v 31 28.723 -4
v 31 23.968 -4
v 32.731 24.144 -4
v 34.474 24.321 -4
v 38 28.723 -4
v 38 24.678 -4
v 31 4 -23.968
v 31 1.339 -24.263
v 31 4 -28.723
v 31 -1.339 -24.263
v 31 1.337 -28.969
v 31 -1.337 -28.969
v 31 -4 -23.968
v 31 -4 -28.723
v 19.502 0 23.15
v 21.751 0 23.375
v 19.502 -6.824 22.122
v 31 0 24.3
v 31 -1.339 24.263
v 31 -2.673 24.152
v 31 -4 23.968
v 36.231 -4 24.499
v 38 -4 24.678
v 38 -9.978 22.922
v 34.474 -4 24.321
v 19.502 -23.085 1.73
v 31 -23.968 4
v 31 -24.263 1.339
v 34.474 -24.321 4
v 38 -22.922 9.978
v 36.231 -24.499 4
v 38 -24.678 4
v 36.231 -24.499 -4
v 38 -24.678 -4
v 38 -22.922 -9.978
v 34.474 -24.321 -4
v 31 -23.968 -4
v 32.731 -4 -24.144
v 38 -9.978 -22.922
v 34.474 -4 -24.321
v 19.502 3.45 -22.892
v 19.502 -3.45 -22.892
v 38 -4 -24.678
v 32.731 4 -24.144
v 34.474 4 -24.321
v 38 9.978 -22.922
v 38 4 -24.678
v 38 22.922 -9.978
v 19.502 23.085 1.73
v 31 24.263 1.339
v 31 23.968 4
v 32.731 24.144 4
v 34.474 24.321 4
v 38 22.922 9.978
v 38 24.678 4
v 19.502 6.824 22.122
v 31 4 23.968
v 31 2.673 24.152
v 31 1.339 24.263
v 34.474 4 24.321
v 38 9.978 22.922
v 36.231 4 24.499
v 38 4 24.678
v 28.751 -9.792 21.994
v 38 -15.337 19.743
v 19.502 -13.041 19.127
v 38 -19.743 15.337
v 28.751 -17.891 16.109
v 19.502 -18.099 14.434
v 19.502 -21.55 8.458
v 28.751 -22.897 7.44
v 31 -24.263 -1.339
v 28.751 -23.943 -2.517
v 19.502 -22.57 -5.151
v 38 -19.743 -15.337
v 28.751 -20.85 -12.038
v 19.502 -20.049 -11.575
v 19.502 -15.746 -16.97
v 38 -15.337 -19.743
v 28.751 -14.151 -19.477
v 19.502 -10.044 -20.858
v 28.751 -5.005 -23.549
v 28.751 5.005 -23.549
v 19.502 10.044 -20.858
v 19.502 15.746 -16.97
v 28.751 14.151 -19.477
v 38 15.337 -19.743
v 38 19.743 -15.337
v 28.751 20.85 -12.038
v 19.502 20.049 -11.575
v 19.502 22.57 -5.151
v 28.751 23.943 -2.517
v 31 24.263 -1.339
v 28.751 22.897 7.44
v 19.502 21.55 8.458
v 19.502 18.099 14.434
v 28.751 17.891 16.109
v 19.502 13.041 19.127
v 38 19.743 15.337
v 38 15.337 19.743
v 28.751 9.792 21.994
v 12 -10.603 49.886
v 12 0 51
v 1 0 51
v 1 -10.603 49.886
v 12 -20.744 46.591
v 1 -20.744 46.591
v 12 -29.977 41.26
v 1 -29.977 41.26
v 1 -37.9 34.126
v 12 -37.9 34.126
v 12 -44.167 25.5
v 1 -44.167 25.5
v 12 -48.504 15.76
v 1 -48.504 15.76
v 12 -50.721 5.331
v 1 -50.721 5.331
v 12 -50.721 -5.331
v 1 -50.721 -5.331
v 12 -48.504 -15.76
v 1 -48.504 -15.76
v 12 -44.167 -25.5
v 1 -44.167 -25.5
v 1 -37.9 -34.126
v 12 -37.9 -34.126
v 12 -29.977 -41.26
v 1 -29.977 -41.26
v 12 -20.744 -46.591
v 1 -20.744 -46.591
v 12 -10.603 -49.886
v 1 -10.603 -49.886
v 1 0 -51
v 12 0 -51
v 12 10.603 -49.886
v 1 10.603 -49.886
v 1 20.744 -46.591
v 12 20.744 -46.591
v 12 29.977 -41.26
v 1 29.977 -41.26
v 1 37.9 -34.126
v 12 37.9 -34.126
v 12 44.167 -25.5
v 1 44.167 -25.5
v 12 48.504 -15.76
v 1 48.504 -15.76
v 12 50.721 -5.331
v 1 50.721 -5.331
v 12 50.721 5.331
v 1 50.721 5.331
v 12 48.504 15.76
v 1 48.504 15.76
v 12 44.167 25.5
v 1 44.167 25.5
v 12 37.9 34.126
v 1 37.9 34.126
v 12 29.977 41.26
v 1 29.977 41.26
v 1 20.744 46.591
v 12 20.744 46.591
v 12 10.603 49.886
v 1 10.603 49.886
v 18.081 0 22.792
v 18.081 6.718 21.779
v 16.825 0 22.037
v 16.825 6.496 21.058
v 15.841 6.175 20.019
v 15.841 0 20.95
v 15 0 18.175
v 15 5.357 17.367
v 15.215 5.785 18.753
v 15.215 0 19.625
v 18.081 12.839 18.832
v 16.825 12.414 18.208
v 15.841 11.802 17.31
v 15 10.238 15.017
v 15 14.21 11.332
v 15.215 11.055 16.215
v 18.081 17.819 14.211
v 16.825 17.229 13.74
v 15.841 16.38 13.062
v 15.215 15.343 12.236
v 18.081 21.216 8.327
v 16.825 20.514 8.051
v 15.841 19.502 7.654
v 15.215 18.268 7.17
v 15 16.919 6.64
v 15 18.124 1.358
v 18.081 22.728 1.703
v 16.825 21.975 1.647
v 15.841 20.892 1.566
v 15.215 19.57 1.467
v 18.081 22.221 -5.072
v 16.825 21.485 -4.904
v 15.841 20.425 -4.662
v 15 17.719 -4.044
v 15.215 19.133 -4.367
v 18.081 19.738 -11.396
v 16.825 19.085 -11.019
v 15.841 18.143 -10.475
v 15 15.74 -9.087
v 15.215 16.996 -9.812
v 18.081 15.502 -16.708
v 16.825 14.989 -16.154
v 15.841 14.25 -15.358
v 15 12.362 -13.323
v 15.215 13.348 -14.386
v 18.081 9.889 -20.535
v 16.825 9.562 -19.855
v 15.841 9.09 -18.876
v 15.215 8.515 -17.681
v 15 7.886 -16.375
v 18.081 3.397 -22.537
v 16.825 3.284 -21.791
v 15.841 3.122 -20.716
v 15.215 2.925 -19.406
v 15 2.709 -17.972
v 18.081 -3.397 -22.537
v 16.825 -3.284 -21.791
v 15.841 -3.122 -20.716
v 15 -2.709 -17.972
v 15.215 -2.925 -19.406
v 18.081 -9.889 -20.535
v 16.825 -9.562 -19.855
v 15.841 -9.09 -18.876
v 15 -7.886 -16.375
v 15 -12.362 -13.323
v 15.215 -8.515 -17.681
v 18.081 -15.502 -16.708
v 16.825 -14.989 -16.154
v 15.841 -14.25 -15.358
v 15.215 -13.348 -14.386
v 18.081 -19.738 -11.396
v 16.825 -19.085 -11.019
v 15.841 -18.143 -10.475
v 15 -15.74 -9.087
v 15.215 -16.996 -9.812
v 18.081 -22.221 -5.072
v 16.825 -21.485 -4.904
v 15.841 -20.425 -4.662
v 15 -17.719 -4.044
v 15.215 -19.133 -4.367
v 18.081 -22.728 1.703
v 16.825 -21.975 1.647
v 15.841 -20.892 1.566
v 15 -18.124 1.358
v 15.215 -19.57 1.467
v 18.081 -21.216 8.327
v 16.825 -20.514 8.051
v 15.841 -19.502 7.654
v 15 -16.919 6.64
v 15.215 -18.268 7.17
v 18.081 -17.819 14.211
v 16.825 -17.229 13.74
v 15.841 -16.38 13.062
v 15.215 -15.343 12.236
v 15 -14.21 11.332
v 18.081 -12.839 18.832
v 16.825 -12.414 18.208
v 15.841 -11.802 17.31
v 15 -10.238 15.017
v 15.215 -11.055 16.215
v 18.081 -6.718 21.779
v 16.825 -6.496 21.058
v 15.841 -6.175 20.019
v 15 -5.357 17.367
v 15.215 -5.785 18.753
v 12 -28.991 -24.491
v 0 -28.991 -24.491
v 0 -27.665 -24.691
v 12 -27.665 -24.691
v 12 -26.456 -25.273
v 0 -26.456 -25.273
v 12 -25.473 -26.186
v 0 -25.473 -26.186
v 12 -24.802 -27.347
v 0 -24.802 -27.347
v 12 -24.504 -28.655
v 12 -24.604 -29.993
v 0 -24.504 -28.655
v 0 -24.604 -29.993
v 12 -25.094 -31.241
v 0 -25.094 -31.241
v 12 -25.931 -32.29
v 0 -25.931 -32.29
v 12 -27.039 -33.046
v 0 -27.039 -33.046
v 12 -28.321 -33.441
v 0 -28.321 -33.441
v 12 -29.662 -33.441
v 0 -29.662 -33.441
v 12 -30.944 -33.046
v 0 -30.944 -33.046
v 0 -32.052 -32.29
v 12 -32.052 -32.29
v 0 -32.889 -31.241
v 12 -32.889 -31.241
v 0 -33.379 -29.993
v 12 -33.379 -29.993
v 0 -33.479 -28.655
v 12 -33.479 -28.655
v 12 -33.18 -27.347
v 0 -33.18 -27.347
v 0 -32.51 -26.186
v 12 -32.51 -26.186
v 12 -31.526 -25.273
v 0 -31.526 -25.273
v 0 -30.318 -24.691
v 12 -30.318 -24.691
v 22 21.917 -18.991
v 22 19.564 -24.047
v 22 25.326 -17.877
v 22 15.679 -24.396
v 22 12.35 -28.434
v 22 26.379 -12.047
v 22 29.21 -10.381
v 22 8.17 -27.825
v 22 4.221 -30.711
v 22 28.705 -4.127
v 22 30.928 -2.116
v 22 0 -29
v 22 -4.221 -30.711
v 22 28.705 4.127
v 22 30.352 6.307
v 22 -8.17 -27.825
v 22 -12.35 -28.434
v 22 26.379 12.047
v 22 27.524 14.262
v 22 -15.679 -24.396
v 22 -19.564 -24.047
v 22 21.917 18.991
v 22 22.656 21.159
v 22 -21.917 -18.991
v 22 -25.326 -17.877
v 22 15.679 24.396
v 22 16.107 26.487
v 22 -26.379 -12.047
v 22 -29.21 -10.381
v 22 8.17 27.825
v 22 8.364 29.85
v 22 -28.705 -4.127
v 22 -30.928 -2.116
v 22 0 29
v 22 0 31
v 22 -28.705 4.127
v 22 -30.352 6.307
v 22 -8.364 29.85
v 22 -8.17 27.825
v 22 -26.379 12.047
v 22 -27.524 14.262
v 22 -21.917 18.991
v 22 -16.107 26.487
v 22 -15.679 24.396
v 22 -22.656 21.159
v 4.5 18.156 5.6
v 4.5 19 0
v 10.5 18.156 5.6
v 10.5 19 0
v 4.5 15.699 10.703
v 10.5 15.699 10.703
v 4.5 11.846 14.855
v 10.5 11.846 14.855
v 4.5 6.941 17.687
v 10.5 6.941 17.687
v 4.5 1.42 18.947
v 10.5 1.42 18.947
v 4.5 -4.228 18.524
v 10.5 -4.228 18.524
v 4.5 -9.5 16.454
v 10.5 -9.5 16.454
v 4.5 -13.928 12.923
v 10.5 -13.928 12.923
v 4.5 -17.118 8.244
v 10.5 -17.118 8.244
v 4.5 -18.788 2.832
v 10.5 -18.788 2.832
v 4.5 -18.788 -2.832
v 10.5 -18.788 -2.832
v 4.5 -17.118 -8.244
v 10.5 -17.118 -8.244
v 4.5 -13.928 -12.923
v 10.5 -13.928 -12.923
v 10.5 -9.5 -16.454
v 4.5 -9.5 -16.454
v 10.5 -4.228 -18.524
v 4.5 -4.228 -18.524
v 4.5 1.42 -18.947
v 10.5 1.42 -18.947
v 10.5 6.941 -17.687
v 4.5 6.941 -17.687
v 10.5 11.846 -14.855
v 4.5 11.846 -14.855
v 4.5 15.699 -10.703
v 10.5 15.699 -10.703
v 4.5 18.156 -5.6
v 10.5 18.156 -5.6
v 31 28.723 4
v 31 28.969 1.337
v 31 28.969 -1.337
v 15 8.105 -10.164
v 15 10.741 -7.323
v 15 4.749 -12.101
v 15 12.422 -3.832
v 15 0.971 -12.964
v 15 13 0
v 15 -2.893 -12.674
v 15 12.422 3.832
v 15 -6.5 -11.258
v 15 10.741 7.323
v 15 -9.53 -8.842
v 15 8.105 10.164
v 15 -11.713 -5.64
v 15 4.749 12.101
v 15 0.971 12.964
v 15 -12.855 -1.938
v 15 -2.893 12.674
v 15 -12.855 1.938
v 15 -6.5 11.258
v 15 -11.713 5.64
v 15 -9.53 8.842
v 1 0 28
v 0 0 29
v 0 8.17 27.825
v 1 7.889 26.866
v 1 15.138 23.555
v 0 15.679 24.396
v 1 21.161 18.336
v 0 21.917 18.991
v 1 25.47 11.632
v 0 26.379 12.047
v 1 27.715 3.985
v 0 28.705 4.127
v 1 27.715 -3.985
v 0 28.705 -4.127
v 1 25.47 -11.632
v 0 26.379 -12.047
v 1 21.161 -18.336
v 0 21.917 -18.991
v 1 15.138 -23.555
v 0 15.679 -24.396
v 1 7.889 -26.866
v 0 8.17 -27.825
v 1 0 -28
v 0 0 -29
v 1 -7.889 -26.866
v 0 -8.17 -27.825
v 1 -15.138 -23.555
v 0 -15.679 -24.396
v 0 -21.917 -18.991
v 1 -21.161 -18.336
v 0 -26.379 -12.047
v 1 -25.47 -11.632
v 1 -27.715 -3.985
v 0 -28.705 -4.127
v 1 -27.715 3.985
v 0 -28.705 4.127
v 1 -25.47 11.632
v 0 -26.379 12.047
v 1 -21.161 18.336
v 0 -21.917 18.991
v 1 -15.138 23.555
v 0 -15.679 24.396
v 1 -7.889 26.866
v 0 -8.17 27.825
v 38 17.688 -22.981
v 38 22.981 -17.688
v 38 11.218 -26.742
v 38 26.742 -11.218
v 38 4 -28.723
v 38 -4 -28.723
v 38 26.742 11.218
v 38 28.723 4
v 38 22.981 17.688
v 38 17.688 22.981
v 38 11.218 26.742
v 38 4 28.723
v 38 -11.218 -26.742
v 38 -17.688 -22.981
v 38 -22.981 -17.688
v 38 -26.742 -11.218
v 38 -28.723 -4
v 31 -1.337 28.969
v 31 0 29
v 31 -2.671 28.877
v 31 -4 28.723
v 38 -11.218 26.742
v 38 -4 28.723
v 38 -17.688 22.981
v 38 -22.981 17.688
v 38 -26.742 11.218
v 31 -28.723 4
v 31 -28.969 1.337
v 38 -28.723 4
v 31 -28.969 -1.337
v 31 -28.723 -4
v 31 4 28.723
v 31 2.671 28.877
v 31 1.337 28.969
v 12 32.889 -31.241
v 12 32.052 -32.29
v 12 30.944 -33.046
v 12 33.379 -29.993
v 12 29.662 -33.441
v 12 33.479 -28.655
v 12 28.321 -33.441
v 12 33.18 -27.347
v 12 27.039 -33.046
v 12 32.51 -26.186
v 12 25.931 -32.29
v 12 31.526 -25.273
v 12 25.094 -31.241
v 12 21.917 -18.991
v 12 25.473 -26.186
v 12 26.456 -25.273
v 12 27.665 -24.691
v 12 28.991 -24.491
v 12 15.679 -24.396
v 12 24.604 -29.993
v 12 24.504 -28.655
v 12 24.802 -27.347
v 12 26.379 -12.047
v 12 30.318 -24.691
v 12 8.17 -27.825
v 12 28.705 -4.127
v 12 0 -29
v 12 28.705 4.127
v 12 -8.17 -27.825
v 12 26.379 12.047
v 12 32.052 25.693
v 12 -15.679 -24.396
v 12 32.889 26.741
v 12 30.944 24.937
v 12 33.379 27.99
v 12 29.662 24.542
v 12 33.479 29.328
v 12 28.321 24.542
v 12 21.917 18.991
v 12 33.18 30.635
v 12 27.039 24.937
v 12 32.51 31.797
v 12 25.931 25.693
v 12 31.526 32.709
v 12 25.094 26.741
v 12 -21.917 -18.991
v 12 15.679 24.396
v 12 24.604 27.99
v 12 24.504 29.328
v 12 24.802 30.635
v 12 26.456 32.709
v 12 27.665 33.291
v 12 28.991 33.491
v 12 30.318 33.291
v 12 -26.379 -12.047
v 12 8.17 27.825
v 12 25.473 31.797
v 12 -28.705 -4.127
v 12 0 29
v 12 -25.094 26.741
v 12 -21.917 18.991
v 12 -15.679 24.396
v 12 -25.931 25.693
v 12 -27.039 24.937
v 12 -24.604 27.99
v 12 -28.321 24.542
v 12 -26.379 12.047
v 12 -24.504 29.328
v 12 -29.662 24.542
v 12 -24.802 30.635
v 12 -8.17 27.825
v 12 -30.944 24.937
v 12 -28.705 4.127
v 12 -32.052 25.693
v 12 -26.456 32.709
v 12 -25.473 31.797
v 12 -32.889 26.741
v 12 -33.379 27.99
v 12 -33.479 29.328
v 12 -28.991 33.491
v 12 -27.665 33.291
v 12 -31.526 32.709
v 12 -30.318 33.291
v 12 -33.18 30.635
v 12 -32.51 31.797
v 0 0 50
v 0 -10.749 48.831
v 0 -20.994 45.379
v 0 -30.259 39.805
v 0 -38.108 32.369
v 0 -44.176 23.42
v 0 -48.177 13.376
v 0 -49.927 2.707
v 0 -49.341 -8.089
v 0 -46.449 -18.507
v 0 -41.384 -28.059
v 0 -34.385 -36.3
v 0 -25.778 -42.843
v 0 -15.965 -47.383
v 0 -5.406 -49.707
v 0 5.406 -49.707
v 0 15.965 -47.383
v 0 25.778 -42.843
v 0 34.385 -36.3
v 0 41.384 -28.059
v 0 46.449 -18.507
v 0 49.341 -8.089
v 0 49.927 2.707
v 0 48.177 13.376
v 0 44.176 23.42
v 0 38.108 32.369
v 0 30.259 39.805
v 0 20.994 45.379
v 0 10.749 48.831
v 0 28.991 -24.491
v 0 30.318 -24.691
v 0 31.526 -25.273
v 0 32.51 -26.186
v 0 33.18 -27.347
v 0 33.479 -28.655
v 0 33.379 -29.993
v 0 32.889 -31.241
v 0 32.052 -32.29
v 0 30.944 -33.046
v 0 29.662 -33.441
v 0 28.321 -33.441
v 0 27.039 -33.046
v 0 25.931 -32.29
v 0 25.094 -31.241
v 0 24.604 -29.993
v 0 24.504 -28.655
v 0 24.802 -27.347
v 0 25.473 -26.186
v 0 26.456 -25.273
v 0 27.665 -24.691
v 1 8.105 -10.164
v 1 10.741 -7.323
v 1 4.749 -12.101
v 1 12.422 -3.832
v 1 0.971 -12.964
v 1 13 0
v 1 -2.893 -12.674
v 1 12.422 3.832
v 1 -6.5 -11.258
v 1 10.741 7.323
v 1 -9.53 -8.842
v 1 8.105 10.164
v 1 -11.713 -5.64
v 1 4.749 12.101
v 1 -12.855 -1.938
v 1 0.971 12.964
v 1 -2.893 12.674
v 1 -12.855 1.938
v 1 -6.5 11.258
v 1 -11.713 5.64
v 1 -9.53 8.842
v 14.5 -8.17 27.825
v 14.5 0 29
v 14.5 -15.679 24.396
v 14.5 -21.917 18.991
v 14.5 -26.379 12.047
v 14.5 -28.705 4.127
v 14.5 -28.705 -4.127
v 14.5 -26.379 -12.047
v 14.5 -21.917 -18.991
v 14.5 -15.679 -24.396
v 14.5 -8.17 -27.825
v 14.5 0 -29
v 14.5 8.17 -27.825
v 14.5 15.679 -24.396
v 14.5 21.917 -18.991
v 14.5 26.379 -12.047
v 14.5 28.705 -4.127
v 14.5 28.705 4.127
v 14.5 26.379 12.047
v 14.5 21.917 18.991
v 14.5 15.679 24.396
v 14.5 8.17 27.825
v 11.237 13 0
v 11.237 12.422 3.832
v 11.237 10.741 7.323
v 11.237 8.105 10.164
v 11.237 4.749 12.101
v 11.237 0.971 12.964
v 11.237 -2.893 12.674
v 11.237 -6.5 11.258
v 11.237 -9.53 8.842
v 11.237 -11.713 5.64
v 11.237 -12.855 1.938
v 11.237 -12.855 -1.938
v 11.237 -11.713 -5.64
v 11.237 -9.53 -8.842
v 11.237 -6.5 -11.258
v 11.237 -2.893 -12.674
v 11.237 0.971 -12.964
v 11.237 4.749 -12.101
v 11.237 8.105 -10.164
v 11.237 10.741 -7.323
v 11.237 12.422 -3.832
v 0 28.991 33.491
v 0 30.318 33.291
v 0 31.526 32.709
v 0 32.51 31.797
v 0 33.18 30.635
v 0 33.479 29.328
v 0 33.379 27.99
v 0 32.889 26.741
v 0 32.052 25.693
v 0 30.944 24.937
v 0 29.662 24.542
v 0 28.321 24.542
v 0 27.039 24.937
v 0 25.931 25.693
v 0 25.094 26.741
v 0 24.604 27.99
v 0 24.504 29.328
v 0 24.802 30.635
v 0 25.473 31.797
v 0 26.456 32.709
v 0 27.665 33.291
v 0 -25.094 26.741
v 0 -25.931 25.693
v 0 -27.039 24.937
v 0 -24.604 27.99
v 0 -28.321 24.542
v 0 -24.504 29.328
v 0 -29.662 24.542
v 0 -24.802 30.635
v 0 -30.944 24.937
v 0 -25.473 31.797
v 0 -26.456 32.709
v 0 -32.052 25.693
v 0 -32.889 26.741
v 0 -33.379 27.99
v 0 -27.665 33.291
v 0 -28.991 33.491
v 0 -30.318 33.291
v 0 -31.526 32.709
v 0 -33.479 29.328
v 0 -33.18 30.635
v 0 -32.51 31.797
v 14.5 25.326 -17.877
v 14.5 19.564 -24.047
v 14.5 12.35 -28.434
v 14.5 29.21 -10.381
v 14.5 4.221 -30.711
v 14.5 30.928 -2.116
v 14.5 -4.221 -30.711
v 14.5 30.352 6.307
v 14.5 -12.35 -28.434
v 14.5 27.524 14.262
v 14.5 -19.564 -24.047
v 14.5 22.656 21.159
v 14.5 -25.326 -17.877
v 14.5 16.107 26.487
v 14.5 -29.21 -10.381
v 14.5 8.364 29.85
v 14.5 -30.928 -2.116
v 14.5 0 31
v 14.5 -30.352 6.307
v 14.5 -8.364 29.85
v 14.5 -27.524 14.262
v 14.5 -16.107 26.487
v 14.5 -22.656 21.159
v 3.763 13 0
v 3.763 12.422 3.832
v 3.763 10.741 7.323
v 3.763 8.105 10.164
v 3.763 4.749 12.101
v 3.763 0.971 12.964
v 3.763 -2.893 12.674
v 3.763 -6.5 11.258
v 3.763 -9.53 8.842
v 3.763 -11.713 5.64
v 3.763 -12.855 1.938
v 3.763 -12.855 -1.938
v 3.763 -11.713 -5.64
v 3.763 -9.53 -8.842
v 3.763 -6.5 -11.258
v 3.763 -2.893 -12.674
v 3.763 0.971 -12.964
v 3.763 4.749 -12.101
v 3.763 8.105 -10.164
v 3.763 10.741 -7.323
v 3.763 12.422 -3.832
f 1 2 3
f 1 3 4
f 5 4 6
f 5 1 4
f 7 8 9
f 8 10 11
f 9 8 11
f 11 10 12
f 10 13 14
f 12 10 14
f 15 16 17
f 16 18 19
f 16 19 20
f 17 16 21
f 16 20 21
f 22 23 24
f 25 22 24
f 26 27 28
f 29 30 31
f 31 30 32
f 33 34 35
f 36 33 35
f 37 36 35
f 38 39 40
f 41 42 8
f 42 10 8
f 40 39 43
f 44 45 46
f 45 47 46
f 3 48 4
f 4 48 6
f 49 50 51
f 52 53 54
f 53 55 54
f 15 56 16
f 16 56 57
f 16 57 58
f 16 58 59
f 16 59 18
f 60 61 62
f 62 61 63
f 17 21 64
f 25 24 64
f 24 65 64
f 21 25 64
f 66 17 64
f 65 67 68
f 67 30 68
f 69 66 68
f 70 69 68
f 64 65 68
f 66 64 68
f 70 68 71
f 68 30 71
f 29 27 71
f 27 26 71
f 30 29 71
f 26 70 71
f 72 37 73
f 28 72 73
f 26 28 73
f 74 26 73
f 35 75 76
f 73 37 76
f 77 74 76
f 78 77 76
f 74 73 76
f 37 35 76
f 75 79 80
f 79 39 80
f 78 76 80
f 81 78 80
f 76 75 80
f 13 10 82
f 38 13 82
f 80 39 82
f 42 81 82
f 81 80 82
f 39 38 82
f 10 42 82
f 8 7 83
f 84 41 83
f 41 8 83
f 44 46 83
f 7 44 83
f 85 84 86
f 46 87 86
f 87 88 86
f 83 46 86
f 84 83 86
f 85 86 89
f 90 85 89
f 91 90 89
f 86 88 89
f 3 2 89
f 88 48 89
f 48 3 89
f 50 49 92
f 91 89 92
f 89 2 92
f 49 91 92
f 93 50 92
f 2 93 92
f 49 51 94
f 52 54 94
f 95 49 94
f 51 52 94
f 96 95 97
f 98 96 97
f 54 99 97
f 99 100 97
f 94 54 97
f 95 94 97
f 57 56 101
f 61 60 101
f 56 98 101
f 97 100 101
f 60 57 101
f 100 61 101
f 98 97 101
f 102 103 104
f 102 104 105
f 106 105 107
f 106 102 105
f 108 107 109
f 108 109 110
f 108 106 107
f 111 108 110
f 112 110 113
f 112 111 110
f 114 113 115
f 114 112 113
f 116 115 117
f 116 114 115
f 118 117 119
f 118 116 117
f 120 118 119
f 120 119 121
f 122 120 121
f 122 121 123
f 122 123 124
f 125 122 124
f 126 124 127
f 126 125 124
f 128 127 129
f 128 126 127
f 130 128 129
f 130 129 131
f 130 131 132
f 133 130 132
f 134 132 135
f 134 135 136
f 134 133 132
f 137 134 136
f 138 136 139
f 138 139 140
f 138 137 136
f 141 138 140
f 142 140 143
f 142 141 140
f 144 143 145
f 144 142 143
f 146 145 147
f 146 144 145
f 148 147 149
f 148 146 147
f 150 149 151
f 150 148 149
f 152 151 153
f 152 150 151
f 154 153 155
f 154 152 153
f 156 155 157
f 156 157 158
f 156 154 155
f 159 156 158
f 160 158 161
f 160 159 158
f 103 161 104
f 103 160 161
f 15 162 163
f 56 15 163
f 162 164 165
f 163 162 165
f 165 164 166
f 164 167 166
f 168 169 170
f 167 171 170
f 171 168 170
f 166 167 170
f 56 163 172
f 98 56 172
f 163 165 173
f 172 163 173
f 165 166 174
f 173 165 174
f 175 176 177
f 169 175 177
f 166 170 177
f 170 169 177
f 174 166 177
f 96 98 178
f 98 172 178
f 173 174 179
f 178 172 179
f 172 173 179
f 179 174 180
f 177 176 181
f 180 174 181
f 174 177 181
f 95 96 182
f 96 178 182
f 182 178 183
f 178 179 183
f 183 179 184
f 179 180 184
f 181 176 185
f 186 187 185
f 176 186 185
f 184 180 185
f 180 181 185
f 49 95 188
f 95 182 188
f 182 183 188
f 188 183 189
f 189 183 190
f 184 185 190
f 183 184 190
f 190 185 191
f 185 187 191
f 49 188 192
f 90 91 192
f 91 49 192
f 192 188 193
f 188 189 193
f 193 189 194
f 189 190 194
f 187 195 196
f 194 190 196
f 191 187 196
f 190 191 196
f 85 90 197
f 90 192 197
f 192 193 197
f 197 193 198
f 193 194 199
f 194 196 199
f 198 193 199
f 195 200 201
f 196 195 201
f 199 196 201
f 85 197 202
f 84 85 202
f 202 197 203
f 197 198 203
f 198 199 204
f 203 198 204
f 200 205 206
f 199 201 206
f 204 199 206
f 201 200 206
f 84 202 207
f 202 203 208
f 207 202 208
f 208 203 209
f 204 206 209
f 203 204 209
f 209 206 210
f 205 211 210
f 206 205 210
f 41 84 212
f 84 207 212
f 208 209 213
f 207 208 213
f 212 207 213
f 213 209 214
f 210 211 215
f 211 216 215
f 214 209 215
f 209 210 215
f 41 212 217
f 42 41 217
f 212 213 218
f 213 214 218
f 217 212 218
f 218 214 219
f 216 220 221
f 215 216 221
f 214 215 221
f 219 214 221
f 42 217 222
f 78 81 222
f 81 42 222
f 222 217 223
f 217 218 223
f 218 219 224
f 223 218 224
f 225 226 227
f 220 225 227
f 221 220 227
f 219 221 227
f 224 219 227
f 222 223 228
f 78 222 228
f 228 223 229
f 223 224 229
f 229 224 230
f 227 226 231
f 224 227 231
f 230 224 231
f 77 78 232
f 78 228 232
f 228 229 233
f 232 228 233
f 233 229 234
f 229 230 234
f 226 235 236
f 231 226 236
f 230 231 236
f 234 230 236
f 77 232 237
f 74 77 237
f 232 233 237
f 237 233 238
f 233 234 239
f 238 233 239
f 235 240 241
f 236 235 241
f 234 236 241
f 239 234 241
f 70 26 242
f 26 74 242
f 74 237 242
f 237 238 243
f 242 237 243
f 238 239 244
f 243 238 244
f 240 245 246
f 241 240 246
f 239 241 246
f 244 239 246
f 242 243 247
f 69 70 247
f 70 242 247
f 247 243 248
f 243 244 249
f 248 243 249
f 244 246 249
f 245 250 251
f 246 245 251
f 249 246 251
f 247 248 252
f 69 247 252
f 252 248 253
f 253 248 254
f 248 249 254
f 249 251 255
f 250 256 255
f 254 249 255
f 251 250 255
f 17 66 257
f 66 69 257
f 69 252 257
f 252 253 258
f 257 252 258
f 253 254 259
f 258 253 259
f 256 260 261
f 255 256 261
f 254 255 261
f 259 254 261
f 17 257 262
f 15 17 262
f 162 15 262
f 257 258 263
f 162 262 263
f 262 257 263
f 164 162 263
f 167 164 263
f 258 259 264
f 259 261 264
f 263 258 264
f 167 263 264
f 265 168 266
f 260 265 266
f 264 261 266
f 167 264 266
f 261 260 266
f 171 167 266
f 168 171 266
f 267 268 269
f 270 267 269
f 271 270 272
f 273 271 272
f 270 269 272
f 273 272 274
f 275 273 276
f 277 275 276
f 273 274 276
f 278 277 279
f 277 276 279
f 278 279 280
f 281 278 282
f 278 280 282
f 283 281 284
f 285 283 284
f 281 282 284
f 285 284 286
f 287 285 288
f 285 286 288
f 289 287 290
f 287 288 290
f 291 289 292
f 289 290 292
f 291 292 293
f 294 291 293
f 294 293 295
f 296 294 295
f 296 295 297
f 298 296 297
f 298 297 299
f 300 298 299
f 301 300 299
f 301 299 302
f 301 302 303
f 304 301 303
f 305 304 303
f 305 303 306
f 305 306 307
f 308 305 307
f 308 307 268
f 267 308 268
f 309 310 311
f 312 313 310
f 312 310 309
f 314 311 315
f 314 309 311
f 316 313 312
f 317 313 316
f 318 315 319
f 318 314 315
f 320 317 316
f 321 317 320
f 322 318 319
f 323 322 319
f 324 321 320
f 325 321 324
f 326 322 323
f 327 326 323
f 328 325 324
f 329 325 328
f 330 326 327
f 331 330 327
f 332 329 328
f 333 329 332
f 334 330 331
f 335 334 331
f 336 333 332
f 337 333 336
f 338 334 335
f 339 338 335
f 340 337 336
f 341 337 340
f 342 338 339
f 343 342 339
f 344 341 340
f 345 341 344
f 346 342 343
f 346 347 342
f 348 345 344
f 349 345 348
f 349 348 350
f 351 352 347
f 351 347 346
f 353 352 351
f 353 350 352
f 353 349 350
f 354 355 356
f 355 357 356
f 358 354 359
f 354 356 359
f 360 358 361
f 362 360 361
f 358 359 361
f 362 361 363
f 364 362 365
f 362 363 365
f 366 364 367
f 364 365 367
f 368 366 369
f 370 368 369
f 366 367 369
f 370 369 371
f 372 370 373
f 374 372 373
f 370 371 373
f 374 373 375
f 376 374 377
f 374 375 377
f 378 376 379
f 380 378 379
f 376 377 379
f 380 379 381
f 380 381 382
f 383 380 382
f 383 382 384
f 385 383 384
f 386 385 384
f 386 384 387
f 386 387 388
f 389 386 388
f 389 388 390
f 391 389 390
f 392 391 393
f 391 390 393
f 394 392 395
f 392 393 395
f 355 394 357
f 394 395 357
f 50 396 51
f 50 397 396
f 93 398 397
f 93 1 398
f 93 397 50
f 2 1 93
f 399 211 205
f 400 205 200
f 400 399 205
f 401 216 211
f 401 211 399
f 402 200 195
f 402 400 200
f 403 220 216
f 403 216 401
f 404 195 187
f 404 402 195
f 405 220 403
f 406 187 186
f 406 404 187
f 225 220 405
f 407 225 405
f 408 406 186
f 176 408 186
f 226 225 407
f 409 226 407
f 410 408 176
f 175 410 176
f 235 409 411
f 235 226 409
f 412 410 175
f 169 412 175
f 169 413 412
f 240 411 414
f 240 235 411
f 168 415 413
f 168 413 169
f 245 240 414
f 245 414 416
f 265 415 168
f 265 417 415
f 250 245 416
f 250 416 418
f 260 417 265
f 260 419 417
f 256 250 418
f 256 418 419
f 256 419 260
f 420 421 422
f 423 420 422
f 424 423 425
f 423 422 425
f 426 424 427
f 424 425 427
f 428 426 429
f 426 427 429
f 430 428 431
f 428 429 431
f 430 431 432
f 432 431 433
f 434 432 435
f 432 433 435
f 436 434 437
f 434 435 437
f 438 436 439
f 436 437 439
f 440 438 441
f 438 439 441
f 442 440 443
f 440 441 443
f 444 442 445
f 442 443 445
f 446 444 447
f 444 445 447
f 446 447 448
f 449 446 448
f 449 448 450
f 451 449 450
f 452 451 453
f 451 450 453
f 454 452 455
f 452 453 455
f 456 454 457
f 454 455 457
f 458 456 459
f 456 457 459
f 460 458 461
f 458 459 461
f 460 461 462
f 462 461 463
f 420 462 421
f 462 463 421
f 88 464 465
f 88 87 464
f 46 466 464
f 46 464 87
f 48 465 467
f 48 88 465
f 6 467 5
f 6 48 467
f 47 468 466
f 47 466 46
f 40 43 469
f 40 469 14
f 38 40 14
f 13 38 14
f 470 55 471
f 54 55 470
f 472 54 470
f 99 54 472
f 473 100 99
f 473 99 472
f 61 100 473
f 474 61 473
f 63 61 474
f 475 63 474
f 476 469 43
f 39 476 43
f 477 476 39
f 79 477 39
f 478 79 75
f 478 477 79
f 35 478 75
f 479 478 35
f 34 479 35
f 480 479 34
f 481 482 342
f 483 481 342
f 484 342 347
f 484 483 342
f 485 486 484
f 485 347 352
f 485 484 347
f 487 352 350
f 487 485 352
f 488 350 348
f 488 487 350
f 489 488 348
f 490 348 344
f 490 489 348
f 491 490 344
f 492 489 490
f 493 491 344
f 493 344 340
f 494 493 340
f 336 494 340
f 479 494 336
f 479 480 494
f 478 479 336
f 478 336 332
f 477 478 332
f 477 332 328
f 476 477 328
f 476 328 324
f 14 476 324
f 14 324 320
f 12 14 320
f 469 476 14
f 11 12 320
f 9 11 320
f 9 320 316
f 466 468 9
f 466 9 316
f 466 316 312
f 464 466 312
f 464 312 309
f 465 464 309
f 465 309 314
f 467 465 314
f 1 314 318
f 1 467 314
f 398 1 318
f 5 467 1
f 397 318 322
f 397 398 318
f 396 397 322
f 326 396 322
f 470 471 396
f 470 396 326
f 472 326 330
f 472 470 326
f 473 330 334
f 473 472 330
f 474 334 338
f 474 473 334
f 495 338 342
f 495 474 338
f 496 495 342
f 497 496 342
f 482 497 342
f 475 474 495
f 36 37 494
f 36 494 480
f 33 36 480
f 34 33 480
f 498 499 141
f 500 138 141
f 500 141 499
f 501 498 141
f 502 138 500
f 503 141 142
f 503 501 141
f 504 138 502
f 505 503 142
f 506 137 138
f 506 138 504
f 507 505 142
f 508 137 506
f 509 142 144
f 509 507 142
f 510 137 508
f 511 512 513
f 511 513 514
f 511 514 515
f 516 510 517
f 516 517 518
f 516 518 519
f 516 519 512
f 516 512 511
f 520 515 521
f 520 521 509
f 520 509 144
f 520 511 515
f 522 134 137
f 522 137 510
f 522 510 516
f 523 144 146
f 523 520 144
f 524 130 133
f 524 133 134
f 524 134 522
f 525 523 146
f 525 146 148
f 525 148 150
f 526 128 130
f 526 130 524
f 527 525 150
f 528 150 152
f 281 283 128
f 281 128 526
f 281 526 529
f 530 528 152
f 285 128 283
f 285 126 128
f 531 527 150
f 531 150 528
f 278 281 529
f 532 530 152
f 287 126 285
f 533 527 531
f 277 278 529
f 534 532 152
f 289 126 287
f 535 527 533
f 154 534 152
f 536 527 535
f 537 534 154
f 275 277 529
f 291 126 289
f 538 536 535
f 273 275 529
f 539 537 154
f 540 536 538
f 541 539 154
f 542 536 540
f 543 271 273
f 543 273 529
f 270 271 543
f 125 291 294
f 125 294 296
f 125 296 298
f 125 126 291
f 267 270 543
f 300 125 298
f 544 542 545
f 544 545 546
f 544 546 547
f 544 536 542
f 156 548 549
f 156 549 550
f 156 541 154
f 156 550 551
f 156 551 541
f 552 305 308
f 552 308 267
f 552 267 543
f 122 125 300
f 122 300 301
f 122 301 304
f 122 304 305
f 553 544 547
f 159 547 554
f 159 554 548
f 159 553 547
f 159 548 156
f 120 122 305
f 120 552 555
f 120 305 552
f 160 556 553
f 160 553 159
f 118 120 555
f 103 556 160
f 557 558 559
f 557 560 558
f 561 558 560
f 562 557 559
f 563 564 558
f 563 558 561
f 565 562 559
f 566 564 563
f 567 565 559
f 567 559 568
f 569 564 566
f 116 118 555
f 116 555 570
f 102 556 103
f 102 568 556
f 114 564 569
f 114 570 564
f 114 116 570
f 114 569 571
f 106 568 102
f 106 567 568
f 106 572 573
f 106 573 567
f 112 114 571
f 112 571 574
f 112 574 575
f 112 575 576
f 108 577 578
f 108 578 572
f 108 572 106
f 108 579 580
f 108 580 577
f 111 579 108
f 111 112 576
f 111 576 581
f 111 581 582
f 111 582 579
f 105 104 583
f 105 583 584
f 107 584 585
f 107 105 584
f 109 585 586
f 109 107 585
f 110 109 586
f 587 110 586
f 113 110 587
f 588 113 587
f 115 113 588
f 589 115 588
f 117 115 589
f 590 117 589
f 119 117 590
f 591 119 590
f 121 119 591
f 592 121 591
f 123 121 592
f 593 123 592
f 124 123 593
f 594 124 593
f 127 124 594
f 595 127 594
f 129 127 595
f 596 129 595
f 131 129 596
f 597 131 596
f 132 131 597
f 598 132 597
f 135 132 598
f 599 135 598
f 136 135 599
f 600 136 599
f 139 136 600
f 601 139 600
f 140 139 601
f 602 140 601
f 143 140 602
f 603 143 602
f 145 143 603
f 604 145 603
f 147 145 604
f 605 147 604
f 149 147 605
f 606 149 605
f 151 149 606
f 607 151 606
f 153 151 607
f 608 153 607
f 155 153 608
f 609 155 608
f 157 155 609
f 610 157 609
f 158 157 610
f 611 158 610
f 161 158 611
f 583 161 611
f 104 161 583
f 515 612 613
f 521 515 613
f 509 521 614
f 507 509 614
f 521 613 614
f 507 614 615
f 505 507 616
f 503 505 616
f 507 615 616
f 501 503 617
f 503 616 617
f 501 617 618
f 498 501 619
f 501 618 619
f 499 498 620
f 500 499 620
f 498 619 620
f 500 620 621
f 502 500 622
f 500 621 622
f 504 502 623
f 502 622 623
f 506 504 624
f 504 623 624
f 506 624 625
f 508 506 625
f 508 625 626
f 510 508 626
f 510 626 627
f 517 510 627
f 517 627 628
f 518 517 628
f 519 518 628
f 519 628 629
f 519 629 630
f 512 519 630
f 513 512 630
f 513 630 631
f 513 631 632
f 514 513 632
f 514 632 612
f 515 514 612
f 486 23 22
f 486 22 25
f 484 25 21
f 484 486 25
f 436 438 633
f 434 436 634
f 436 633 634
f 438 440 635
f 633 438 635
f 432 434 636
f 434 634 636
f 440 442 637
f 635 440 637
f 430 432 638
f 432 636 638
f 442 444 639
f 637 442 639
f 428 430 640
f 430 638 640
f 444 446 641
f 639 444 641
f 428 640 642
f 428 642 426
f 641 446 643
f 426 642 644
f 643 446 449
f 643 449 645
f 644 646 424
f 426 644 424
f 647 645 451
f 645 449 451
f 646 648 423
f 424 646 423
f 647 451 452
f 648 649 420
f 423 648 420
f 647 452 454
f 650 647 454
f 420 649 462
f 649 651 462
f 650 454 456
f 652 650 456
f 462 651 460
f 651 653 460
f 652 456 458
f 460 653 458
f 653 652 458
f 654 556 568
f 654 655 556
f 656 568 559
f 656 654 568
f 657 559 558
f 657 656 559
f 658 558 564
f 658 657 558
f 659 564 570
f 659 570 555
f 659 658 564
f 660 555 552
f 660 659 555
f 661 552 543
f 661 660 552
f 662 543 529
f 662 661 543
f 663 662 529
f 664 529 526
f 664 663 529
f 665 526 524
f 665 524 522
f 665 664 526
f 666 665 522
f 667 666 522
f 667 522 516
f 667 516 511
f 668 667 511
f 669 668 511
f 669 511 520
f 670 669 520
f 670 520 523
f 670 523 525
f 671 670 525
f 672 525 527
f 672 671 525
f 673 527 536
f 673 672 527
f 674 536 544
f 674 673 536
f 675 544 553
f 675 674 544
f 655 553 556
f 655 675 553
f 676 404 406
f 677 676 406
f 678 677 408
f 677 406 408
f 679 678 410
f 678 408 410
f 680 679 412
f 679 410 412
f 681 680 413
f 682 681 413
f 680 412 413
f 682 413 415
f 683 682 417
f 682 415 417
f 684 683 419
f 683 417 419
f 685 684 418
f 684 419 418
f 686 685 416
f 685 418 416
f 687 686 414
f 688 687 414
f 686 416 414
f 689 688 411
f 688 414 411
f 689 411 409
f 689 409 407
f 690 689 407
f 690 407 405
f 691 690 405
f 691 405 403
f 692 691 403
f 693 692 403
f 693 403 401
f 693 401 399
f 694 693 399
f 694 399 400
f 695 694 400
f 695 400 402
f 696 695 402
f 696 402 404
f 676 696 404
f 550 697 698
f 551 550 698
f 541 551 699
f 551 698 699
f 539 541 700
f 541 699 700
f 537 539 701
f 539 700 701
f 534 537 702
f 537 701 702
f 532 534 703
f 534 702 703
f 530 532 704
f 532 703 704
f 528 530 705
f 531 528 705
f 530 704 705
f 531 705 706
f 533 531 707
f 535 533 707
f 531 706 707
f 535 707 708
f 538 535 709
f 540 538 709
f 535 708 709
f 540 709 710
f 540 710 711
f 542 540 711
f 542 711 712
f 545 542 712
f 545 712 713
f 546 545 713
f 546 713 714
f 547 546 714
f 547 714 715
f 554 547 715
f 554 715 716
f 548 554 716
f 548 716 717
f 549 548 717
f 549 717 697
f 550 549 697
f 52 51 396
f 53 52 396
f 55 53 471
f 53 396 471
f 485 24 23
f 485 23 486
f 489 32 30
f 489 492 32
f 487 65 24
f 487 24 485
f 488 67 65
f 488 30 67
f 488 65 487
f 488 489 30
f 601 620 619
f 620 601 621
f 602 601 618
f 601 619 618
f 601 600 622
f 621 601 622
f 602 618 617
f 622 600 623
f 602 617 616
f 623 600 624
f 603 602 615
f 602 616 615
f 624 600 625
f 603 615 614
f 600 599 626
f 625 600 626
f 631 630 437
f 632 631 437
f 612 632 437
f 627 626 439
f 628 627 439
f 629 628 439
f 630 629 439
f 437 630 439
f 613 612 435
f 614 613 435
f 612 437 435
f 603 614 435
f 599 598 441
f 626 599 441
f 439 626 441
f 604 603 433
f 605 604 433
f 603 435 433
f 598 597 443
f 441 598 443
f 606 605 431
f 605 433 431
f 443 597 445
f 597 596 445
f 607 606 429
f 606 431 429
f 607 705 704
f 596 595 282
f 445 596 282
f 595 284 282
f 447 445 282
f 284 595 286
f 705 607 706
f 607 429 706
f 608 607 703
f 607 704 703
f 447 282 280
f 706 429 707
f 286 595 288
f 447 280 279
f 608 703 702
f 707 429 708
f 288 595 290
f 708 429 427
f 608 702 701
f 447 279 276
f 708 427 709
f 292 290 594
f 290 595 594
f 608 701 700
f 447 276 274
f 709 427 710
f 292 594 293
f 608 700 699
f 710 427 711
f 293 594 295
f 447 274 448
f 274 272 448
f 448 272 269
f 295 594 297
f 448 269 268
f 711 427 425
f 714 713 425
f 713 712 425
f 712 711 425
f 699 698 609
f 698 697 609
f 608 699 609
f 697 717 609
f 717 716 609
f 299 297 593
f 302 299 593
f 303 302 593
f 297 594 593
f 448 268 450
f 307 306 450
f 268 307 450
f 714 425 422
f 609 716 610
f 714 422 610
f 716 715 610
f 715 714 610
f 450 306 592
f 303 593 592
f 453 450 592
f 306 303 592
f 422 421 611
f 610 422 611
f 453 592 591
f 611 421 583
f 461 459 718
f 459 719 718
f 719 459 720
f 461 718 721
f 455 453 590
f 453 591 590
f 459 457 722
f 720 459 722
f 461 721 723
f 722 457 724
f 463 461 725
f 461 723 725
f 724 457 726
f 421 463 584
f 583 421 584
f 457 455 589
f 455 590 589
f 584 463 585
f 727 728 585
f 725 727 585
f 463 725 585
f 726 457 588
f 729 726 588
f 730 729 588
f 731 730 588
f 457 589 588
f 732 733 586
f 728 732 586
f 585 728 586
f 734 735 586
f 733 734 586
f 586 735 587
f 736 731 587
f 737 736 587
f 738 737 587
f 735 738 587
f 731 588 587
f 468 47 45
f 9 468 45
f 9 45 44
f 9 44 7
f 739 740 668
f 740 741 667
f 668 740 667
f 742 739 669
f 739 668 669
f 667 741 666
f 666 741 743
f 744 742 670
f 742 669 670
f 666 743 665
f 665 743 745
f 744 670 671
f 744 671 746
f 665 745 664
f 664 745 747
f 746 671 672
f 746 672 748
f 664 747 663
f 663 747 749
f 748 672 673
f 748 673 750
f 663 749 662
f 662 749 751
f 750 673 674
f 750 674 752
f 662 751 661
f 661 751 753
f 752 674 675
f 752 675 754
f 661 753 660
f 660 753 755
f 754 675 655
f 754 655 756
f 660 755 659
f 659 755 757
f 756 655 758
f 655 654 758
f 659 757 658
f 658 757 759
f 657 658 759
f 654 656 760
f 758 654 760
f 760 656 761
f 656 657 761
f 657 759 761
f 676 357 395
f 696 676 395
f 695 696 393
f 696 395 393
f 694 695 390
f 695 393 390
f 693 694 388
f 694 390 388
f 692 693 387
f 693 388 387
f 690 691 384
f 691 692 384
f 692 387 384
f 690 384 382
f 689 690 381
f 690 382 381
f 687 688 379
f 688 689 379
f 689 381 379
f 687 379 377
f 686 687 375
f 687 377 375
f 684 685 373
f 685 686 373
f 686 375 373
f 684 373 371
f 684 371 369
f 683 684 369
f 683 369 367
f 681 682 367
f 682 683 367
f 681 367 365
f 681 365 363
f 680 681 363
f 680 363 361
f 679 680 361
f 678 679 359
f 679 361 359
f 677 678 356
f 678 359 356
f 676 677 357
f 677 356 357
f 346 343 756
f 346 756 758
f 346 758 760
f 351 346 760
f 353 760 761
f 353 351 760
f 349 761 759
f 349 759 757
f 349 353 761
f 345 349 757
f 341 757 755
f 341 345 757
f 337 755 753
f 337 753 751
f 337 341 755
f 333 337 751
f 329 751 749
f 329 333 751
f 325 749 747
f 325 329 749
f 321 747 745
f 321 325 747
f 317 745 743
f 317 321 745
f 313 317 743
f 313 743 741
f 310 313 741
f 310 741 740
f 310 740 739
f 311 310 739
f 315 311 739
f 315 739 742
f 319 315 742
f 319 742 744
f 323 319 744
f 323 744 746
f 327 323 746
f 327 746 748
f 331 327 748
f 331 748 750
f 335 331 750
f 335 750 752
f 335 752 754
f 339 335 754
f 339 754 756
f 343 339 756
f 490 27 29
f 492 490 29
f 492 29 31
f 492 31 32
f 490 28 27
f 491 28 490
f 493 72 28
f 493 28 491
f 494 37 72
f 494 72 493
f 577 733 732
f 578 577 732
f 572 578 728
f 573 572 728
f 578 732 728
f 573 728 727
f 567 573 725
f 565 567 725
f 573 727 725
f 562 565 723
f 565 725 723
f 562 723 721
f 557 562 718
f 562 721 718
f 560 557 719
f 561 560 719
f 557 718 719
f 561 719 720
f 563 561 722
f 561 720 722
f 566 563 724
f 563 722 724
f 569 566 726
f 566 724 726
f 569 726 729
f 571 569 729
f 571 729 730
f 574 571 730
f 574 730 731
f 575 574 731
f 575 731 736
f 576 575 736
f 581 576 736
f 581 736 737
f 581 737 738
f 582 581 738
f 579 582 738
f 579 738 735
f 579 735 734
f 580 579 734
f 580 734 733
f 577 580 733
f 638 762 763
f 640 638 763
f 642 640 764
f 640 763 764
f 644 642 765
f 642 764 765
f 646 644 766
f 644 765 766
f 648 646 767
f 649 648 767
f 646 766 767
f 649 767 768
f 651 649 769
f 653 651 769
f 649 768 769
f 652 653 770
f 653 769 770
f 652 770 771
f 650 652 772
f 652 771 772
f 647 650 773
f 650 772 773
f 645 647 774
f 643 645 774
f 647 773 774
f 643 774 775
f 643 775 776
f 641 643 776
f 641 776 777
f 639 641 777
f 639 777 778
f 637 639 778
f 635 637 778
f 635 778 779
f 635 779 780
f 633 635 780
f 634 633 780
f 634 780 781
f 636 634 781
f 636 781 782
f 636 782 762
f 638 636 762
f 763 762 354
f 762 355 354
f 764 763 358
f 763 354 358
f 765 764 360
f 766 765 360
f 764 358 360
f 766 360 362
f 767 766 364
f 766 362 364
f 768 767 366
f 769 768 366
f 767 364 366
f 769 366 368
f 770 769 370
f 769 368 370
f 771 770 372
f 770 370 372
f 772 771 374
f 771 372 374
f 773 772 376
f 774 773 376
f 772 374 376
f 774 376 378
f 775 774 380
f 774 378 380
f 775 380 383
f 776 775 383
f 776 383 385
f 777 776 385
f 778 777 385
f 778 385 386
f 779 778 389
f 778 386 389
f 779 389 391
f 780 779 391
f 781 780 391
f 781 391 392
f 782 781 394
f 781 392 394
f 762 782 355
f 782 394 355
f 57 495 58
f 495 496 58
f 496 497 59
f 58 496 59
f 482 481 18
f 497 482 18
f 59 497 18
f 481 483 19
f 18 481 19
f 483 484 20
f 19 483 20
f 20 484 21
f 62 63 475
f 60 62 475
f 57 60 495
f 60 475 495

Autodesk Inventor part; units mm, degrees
ref_plane "YZ Plane" through (0, 0, 0) normal (1, 0, 0) x (0, 1, 0)
ref_plane "XZ Plane" through (0, 0, 0) normal (0, 1, 0) x (-1, 0, 0)
ref_plane "XY Plane" through (0, 0, 0) normal (0, 0, 1) x (1, 0, 0)
sketch "草图1" plane through (0, 0, 0) normal (0, 1, 0) x (-1, 0, 0)
  line L0 (0, 51) -> (-12, 51)
  line L1 (-12, 51) -> (-12, 29)
  line L2 (-12, 29) -> (-14.5, 29)
  line L3 (-14.5, 29) -> (-14.5, 31)
  line L4 (-14.5, 31) -> (-22, 31)
  line L5 (-22, 31) -> (-22, 29)
  line L6 (-22, 29) -> (-38, 29)
  line L7 (-38, 29) -> (-38, 0)
  line L8 (-38, 0) -> (0, 0)
  line L9 (0, 0) -> (0, 51)
  line L10 (0, 29) -> (-1, 28)
  line L11 (-1, 28) -> (-1, 0)
  line L12 (-38, 25) -> (-15, 22.6998)
  line L13 (-15, 22.6998) -> (-15, 0)
  line L14 (7.6, 0) -> (-45.6, 0) projected
  dimension "d2" = 51
  dimension "d4" = 26
  dimension "d5" = 12
  dimension "d6" = 31
  dimension "d7" = 29
  dimension "d8" = 10
  dimension "d9" = 2.5
  dimension "d10" = 29
  dimension "d11" = 45
  dimension "d12" = 1
  dimension "d13" = 15
  dimension "d14" = 25
  dimension "d15" = 84.289
revolve "旋转1" add sketch "草图1" angle 360 about axis through (-10, 0, 0) along (1, 0, 0) contours L9 L10 L11 L8 L13 L12 L7 L6 L5 L4 L3 L2 L1 L0
sketch "草图2" plane through (0, 0, 0) normal (0, 1, 0) x (-1, 0, 0)
  line L0 (-22, 29) -> (-38, 29) projected
  line L1 (-38, 29) -> (-31, 29)
  line L2 (-31, 29) -> (-31, -29)
  line L3 (-31, -29) -> (-38, -29)
  line L4 (-38, -29) -> (-38, 29)
  point P0 (0, 0)
  dimension "d17" = 7
extrude "拉伸1" cut sketch "草图2" along normal mid plane 8
sketch "草图3" plane through (0, 0, 0) normal (0, 0, 1) x (1, 0, 0)
  line L0 (38, 4) -> (38, 29) projected
  line L1 (22, -29) -> (38, -29) projected
  line L2 (38, 29) -> (31, 29)
  line L3 (31, 29) -> (31, -29)
  line L4 (31, -29) -> (38, -29)
  line L5 (38, -29) -> (38, 29)
  point P0 (0, 0)
  dimension "d20" = 7
extrude "拉伸2" cut sketch "草图3" along normal mid plane 8
sketch "草图4" plane through (0, 0, 0) normal (-1, 0, 0) x (0, 0, 1)
  circle A0 centre (28.9914, 28.9914) radius 4.5
  circle A1 centre (-28.9914, 28.9914) radius 4.5
  circle A2 centre (-28.9914, -28.9914) radius 4.5
  circle A3 centre (28.9914, -28.9914) radius 4.5
  line L0 (28.9914, 28.9914) -> (0, 0)
  line L1 (0, -71.4) -> (0, 71.4) projected
  dimension "d23" = 9
  dimension "d24" = 41
  dimension "d27" = 360
  dimension "d42" = 45
extrude "拉伸3" cut sketch "草图4" against normal up to surface (12 mm away)
chamfer "倒角1" distance 1 angle 45 1 edges at (0, 0, -51)
fillet "圆角1" radius 5 1 edges at (15, 0, -22.6998)
sketch "草图5" plane through (0, 0, 0) normal (0, 0, 1) x (1, 0, 0)
  line L0 (0, -29) -> (0, 29) projected
  line L1 (0, 13) -> (3.7633, 13)
  line L2 (3.7633, 13) -> (4.5, 19)
  line L3 (4.5, 19) -> (10.5, 19)
  line L4 (10.5, 19) -> (11.2367, 13)
  line L5 (11.2367, 13) -> (15, 13)
  line L6 (15, 18.1749) -> (15, -18.1749) projected
  line L7 (0, 13) -> (0, 0)
  line L8 (0, 0) -> (15, 0)
  line L9 (15, 13) -> (15, 0)
  line L10 (-7.6, 0) -> (45.6, 0) projected
  point P0 (7.5, 19)
  dimension "d35" = 13
  dimension "d36" = 19
  dimension "d37" = 6
  dimension "d38" = 7
  dimension "d39" = 7
  dimension "d40" = 7.5
revolve "旋转2" cut sketch "草图5" angle 360 about axis through (-10, 0, 0) along (1, 0, 0)
equation "\"d2\" = 0.5 * D2"
equation "\"d4\" = M"
equation "\"d5\" = e"
equation "\"d6\" = 0.5 * D"
equation "\"d7\" = 0.5 * D_d"
equation "\"d8\" = e1"
equation "\"d10\" = 0.5 * D_d"
equation "\"d13\" = b1"
equation "\"d14\" = 0.5 * D4"
equation "\"d17\" = h_b"
equation "\"d18\" = b"
equation "\"d20\" = h_b"
equation "\"d21\" = b"
equation "\"d23\" = d0"
equation "\"d24\" = 0.5 * D0"
equation "\"d29\" = b"
equation "\"d35\" = 0.5 * d1"
equation "\"d36\" = 0.5 * d1_D0"
equation "\"d37\" = d1_b"
equation "\"d40\" = 0.5 * b1"
equation "\"d3\" = 8"
equation "\"d0\" = 9"
equation "\"D\" = 62"
equation "\"D0\" = 82"
equation "\"D2\" = 102"
equation "\"D_d\" = 58"
equation "\"e\" = 12"
equation "\"e1\" = 10"
equation "\"b\" = 8"
equation "\"h_b\" = 7"
equation "\"M\" = 26"
equation "\"b1\" = 15"
equation "\"d1\" = 26"
equation "\"d1_D0\" = 38"
equation "\"d1_b\" = 6"
equation "\"D4\" = 50"
properties part number "高速轴承透盖" material "灰口铁"
